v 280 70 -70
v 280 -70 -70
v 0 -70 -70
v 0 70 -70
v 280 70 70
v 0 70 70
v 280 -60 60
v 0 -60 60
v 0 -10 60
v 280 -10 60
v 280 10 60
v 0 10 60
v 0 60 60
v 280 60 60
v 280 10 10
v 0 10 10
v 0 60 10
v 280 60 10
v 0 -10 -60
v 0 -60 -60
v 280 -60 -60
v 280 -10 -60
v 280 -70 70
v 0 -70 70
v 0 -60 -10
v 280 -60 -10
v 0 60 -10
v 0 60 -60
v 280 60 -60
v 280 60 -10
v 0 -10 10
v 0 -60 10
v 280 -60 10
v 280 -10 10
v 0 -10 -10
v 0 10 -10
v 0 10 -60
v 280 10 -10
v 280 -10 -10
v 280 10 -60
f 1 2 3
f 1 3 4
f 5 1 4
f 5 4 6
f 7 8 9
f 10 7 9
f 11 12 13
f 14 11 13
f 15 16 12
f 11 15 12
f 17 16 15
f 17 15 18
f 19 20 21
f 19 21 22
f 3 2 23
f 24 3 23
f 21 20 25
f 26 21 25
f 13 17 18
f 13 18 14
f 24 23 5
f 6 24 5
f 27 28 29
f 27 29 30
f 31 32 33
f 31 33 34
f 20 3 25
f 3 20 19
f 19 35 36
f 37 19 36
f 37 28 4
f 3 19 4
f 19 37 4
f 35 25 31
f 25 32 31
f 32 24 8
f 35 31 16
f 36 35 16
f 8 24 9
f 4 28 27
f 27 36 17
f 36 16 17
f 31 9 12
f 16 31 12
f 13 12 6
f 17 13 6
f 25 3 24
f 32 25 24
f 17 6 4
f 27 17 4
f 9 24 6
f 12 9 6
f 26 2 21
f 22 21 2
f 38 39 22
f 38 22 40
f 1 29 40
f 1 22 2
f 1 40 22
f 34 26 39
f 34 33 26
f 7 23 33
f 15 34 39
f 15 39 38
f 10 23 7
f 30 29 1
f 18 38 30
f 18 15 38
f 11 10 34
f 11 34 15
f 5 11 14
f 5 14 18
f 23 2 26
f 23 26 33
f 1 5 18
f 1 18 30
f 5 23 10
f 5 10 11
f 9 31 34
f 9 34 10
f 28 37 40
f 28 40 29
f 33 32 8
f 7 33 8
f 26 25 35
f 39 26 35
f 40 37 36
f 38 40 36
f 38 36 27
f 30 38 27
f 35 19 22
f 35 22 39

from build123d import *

# Parameters (mm, degrees)
SKETCH_W   = 140
SKETCH_H   = 140
SKETCH_W_2 = 50
SKETCH_H_2 = 50
PAD_DEPTH  = 280


with BuildPart() as part:
    # Sketch → Pad (new body)
    with BuildSketch(Plane.YZ):
        Rectangle(SKETCH_W, SKETCH_H)
        with Locations((35, 35)):
            Rectangle(SKETCH_W_2, SKETCH_H_2, mode=Mode.SUBTRACT)
        with Locations((-35, 35)):
            Rectangle(SKETCH_W_2, SKETCH_H_2, mode=Mode.SUBTRACT)
        with Locations((-35, -35)):
            Rectangle(SKETCH_W_2, SKETCH_H_2, mode=Mode.SUBTRACT)
        with Locations((35, -35)):
            Rectangle(SKETCH_W_2, SKETCH_H_2, mode=Mode.SUBTRACT)
    extrude(amount=PAD_DEPTH)


solid = part.part
